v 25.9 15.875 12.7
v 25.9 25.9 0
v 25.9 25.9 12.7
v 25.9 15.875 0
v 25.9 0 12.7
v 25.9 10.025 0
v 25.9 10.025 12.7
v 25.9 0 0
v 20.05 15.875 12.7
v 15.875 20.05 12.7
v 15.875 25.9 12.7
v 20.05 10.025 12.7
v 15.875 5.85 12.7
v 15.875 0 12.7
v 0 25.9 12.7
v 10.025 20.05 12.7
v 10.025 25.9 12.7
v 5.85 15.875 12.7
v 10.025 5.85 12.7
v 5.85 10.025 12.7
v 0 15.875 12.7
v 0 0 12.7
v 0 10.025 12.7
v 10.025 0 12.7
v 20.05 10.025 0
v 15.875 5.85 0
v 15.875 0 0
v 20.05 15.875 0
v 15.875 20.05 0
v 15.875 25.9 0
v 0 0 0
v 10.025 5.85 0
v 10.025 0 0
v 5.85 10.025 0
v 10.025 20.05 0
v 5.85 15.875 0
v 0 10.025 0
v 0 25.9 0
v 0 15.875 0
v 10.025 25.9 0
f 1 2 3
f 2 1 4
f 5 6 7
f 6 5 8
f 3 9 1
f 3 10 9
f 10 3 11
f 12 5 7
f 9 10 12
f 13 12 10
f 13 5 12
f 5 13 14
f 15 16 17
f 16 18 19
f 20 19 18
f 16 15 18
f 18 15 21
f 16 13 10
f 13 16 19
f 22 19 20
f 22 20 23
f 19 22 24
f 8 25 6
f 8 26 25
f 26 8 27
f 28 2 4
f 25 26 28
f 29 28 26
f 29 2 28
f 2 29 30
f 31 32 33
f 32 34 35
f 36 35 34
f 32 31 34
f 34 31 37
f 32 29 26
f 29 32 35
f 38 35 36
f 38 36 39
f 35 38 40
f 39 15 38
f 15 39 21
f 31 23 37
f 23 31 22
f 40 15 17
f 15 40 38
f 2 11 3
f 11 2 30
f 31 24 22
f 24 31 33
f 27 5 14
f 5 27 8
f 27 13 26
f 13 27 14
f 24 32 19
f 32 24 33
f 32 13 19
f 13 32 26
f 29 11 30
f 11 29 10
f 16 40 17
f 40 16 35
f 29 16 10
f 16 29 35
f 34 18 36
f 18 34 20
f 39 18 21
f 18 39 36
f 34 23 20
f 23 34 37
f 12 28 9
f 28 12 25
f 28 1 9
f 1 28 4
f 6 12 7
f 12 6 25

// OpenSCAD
// Phillip Showers
// CC - GNU

$fn = 45;

in2mm=25.4;

adjustment=.5;
alSide = in2mm+adjustment;
adSideCuts = .25*in2mm-adjustment;

moduleHeight = .5*in2mm;

module aluminium8020()
{
    difference(){
        cube([alSide, alSide, moduleHeight]);
        
        translate([alSide/2-(adSideCuts/2),0,0]) 
            cube([adSideCuts, adSideCuts, moduleHeight]);
        translate([alSide/2-(adSideCuts/2),alSide-adSideCuts,0])
            cube([adSideCuts, adSideCuts, moduleHeight]);
        translate([0,alSide/2-(adSideCuts/2),0])
            cube([adSideCuts, adSideCuts, moduleHeight]);
        translate([alSide-adSideCuts,alSide/2-(adSideCuts/2),0])
            cube([adSideCuts, adSideCuts, moduleHeight]);
    }
}

module linearBearing(){
    difference(){
        cube([1.25*in2mm, 1.25*in2mm, moduleHeight]);
        translate([1/8*in2mm,1/8*in2mm,0])aluminium8020();
        translate([(in2mm/4), (in2mm/4),])cube([.75*in2mm, .75*in2mm, moduleHeight]);
    }
}






motorMount();
module motorMount(){
    
    
}


aluminium8020();
